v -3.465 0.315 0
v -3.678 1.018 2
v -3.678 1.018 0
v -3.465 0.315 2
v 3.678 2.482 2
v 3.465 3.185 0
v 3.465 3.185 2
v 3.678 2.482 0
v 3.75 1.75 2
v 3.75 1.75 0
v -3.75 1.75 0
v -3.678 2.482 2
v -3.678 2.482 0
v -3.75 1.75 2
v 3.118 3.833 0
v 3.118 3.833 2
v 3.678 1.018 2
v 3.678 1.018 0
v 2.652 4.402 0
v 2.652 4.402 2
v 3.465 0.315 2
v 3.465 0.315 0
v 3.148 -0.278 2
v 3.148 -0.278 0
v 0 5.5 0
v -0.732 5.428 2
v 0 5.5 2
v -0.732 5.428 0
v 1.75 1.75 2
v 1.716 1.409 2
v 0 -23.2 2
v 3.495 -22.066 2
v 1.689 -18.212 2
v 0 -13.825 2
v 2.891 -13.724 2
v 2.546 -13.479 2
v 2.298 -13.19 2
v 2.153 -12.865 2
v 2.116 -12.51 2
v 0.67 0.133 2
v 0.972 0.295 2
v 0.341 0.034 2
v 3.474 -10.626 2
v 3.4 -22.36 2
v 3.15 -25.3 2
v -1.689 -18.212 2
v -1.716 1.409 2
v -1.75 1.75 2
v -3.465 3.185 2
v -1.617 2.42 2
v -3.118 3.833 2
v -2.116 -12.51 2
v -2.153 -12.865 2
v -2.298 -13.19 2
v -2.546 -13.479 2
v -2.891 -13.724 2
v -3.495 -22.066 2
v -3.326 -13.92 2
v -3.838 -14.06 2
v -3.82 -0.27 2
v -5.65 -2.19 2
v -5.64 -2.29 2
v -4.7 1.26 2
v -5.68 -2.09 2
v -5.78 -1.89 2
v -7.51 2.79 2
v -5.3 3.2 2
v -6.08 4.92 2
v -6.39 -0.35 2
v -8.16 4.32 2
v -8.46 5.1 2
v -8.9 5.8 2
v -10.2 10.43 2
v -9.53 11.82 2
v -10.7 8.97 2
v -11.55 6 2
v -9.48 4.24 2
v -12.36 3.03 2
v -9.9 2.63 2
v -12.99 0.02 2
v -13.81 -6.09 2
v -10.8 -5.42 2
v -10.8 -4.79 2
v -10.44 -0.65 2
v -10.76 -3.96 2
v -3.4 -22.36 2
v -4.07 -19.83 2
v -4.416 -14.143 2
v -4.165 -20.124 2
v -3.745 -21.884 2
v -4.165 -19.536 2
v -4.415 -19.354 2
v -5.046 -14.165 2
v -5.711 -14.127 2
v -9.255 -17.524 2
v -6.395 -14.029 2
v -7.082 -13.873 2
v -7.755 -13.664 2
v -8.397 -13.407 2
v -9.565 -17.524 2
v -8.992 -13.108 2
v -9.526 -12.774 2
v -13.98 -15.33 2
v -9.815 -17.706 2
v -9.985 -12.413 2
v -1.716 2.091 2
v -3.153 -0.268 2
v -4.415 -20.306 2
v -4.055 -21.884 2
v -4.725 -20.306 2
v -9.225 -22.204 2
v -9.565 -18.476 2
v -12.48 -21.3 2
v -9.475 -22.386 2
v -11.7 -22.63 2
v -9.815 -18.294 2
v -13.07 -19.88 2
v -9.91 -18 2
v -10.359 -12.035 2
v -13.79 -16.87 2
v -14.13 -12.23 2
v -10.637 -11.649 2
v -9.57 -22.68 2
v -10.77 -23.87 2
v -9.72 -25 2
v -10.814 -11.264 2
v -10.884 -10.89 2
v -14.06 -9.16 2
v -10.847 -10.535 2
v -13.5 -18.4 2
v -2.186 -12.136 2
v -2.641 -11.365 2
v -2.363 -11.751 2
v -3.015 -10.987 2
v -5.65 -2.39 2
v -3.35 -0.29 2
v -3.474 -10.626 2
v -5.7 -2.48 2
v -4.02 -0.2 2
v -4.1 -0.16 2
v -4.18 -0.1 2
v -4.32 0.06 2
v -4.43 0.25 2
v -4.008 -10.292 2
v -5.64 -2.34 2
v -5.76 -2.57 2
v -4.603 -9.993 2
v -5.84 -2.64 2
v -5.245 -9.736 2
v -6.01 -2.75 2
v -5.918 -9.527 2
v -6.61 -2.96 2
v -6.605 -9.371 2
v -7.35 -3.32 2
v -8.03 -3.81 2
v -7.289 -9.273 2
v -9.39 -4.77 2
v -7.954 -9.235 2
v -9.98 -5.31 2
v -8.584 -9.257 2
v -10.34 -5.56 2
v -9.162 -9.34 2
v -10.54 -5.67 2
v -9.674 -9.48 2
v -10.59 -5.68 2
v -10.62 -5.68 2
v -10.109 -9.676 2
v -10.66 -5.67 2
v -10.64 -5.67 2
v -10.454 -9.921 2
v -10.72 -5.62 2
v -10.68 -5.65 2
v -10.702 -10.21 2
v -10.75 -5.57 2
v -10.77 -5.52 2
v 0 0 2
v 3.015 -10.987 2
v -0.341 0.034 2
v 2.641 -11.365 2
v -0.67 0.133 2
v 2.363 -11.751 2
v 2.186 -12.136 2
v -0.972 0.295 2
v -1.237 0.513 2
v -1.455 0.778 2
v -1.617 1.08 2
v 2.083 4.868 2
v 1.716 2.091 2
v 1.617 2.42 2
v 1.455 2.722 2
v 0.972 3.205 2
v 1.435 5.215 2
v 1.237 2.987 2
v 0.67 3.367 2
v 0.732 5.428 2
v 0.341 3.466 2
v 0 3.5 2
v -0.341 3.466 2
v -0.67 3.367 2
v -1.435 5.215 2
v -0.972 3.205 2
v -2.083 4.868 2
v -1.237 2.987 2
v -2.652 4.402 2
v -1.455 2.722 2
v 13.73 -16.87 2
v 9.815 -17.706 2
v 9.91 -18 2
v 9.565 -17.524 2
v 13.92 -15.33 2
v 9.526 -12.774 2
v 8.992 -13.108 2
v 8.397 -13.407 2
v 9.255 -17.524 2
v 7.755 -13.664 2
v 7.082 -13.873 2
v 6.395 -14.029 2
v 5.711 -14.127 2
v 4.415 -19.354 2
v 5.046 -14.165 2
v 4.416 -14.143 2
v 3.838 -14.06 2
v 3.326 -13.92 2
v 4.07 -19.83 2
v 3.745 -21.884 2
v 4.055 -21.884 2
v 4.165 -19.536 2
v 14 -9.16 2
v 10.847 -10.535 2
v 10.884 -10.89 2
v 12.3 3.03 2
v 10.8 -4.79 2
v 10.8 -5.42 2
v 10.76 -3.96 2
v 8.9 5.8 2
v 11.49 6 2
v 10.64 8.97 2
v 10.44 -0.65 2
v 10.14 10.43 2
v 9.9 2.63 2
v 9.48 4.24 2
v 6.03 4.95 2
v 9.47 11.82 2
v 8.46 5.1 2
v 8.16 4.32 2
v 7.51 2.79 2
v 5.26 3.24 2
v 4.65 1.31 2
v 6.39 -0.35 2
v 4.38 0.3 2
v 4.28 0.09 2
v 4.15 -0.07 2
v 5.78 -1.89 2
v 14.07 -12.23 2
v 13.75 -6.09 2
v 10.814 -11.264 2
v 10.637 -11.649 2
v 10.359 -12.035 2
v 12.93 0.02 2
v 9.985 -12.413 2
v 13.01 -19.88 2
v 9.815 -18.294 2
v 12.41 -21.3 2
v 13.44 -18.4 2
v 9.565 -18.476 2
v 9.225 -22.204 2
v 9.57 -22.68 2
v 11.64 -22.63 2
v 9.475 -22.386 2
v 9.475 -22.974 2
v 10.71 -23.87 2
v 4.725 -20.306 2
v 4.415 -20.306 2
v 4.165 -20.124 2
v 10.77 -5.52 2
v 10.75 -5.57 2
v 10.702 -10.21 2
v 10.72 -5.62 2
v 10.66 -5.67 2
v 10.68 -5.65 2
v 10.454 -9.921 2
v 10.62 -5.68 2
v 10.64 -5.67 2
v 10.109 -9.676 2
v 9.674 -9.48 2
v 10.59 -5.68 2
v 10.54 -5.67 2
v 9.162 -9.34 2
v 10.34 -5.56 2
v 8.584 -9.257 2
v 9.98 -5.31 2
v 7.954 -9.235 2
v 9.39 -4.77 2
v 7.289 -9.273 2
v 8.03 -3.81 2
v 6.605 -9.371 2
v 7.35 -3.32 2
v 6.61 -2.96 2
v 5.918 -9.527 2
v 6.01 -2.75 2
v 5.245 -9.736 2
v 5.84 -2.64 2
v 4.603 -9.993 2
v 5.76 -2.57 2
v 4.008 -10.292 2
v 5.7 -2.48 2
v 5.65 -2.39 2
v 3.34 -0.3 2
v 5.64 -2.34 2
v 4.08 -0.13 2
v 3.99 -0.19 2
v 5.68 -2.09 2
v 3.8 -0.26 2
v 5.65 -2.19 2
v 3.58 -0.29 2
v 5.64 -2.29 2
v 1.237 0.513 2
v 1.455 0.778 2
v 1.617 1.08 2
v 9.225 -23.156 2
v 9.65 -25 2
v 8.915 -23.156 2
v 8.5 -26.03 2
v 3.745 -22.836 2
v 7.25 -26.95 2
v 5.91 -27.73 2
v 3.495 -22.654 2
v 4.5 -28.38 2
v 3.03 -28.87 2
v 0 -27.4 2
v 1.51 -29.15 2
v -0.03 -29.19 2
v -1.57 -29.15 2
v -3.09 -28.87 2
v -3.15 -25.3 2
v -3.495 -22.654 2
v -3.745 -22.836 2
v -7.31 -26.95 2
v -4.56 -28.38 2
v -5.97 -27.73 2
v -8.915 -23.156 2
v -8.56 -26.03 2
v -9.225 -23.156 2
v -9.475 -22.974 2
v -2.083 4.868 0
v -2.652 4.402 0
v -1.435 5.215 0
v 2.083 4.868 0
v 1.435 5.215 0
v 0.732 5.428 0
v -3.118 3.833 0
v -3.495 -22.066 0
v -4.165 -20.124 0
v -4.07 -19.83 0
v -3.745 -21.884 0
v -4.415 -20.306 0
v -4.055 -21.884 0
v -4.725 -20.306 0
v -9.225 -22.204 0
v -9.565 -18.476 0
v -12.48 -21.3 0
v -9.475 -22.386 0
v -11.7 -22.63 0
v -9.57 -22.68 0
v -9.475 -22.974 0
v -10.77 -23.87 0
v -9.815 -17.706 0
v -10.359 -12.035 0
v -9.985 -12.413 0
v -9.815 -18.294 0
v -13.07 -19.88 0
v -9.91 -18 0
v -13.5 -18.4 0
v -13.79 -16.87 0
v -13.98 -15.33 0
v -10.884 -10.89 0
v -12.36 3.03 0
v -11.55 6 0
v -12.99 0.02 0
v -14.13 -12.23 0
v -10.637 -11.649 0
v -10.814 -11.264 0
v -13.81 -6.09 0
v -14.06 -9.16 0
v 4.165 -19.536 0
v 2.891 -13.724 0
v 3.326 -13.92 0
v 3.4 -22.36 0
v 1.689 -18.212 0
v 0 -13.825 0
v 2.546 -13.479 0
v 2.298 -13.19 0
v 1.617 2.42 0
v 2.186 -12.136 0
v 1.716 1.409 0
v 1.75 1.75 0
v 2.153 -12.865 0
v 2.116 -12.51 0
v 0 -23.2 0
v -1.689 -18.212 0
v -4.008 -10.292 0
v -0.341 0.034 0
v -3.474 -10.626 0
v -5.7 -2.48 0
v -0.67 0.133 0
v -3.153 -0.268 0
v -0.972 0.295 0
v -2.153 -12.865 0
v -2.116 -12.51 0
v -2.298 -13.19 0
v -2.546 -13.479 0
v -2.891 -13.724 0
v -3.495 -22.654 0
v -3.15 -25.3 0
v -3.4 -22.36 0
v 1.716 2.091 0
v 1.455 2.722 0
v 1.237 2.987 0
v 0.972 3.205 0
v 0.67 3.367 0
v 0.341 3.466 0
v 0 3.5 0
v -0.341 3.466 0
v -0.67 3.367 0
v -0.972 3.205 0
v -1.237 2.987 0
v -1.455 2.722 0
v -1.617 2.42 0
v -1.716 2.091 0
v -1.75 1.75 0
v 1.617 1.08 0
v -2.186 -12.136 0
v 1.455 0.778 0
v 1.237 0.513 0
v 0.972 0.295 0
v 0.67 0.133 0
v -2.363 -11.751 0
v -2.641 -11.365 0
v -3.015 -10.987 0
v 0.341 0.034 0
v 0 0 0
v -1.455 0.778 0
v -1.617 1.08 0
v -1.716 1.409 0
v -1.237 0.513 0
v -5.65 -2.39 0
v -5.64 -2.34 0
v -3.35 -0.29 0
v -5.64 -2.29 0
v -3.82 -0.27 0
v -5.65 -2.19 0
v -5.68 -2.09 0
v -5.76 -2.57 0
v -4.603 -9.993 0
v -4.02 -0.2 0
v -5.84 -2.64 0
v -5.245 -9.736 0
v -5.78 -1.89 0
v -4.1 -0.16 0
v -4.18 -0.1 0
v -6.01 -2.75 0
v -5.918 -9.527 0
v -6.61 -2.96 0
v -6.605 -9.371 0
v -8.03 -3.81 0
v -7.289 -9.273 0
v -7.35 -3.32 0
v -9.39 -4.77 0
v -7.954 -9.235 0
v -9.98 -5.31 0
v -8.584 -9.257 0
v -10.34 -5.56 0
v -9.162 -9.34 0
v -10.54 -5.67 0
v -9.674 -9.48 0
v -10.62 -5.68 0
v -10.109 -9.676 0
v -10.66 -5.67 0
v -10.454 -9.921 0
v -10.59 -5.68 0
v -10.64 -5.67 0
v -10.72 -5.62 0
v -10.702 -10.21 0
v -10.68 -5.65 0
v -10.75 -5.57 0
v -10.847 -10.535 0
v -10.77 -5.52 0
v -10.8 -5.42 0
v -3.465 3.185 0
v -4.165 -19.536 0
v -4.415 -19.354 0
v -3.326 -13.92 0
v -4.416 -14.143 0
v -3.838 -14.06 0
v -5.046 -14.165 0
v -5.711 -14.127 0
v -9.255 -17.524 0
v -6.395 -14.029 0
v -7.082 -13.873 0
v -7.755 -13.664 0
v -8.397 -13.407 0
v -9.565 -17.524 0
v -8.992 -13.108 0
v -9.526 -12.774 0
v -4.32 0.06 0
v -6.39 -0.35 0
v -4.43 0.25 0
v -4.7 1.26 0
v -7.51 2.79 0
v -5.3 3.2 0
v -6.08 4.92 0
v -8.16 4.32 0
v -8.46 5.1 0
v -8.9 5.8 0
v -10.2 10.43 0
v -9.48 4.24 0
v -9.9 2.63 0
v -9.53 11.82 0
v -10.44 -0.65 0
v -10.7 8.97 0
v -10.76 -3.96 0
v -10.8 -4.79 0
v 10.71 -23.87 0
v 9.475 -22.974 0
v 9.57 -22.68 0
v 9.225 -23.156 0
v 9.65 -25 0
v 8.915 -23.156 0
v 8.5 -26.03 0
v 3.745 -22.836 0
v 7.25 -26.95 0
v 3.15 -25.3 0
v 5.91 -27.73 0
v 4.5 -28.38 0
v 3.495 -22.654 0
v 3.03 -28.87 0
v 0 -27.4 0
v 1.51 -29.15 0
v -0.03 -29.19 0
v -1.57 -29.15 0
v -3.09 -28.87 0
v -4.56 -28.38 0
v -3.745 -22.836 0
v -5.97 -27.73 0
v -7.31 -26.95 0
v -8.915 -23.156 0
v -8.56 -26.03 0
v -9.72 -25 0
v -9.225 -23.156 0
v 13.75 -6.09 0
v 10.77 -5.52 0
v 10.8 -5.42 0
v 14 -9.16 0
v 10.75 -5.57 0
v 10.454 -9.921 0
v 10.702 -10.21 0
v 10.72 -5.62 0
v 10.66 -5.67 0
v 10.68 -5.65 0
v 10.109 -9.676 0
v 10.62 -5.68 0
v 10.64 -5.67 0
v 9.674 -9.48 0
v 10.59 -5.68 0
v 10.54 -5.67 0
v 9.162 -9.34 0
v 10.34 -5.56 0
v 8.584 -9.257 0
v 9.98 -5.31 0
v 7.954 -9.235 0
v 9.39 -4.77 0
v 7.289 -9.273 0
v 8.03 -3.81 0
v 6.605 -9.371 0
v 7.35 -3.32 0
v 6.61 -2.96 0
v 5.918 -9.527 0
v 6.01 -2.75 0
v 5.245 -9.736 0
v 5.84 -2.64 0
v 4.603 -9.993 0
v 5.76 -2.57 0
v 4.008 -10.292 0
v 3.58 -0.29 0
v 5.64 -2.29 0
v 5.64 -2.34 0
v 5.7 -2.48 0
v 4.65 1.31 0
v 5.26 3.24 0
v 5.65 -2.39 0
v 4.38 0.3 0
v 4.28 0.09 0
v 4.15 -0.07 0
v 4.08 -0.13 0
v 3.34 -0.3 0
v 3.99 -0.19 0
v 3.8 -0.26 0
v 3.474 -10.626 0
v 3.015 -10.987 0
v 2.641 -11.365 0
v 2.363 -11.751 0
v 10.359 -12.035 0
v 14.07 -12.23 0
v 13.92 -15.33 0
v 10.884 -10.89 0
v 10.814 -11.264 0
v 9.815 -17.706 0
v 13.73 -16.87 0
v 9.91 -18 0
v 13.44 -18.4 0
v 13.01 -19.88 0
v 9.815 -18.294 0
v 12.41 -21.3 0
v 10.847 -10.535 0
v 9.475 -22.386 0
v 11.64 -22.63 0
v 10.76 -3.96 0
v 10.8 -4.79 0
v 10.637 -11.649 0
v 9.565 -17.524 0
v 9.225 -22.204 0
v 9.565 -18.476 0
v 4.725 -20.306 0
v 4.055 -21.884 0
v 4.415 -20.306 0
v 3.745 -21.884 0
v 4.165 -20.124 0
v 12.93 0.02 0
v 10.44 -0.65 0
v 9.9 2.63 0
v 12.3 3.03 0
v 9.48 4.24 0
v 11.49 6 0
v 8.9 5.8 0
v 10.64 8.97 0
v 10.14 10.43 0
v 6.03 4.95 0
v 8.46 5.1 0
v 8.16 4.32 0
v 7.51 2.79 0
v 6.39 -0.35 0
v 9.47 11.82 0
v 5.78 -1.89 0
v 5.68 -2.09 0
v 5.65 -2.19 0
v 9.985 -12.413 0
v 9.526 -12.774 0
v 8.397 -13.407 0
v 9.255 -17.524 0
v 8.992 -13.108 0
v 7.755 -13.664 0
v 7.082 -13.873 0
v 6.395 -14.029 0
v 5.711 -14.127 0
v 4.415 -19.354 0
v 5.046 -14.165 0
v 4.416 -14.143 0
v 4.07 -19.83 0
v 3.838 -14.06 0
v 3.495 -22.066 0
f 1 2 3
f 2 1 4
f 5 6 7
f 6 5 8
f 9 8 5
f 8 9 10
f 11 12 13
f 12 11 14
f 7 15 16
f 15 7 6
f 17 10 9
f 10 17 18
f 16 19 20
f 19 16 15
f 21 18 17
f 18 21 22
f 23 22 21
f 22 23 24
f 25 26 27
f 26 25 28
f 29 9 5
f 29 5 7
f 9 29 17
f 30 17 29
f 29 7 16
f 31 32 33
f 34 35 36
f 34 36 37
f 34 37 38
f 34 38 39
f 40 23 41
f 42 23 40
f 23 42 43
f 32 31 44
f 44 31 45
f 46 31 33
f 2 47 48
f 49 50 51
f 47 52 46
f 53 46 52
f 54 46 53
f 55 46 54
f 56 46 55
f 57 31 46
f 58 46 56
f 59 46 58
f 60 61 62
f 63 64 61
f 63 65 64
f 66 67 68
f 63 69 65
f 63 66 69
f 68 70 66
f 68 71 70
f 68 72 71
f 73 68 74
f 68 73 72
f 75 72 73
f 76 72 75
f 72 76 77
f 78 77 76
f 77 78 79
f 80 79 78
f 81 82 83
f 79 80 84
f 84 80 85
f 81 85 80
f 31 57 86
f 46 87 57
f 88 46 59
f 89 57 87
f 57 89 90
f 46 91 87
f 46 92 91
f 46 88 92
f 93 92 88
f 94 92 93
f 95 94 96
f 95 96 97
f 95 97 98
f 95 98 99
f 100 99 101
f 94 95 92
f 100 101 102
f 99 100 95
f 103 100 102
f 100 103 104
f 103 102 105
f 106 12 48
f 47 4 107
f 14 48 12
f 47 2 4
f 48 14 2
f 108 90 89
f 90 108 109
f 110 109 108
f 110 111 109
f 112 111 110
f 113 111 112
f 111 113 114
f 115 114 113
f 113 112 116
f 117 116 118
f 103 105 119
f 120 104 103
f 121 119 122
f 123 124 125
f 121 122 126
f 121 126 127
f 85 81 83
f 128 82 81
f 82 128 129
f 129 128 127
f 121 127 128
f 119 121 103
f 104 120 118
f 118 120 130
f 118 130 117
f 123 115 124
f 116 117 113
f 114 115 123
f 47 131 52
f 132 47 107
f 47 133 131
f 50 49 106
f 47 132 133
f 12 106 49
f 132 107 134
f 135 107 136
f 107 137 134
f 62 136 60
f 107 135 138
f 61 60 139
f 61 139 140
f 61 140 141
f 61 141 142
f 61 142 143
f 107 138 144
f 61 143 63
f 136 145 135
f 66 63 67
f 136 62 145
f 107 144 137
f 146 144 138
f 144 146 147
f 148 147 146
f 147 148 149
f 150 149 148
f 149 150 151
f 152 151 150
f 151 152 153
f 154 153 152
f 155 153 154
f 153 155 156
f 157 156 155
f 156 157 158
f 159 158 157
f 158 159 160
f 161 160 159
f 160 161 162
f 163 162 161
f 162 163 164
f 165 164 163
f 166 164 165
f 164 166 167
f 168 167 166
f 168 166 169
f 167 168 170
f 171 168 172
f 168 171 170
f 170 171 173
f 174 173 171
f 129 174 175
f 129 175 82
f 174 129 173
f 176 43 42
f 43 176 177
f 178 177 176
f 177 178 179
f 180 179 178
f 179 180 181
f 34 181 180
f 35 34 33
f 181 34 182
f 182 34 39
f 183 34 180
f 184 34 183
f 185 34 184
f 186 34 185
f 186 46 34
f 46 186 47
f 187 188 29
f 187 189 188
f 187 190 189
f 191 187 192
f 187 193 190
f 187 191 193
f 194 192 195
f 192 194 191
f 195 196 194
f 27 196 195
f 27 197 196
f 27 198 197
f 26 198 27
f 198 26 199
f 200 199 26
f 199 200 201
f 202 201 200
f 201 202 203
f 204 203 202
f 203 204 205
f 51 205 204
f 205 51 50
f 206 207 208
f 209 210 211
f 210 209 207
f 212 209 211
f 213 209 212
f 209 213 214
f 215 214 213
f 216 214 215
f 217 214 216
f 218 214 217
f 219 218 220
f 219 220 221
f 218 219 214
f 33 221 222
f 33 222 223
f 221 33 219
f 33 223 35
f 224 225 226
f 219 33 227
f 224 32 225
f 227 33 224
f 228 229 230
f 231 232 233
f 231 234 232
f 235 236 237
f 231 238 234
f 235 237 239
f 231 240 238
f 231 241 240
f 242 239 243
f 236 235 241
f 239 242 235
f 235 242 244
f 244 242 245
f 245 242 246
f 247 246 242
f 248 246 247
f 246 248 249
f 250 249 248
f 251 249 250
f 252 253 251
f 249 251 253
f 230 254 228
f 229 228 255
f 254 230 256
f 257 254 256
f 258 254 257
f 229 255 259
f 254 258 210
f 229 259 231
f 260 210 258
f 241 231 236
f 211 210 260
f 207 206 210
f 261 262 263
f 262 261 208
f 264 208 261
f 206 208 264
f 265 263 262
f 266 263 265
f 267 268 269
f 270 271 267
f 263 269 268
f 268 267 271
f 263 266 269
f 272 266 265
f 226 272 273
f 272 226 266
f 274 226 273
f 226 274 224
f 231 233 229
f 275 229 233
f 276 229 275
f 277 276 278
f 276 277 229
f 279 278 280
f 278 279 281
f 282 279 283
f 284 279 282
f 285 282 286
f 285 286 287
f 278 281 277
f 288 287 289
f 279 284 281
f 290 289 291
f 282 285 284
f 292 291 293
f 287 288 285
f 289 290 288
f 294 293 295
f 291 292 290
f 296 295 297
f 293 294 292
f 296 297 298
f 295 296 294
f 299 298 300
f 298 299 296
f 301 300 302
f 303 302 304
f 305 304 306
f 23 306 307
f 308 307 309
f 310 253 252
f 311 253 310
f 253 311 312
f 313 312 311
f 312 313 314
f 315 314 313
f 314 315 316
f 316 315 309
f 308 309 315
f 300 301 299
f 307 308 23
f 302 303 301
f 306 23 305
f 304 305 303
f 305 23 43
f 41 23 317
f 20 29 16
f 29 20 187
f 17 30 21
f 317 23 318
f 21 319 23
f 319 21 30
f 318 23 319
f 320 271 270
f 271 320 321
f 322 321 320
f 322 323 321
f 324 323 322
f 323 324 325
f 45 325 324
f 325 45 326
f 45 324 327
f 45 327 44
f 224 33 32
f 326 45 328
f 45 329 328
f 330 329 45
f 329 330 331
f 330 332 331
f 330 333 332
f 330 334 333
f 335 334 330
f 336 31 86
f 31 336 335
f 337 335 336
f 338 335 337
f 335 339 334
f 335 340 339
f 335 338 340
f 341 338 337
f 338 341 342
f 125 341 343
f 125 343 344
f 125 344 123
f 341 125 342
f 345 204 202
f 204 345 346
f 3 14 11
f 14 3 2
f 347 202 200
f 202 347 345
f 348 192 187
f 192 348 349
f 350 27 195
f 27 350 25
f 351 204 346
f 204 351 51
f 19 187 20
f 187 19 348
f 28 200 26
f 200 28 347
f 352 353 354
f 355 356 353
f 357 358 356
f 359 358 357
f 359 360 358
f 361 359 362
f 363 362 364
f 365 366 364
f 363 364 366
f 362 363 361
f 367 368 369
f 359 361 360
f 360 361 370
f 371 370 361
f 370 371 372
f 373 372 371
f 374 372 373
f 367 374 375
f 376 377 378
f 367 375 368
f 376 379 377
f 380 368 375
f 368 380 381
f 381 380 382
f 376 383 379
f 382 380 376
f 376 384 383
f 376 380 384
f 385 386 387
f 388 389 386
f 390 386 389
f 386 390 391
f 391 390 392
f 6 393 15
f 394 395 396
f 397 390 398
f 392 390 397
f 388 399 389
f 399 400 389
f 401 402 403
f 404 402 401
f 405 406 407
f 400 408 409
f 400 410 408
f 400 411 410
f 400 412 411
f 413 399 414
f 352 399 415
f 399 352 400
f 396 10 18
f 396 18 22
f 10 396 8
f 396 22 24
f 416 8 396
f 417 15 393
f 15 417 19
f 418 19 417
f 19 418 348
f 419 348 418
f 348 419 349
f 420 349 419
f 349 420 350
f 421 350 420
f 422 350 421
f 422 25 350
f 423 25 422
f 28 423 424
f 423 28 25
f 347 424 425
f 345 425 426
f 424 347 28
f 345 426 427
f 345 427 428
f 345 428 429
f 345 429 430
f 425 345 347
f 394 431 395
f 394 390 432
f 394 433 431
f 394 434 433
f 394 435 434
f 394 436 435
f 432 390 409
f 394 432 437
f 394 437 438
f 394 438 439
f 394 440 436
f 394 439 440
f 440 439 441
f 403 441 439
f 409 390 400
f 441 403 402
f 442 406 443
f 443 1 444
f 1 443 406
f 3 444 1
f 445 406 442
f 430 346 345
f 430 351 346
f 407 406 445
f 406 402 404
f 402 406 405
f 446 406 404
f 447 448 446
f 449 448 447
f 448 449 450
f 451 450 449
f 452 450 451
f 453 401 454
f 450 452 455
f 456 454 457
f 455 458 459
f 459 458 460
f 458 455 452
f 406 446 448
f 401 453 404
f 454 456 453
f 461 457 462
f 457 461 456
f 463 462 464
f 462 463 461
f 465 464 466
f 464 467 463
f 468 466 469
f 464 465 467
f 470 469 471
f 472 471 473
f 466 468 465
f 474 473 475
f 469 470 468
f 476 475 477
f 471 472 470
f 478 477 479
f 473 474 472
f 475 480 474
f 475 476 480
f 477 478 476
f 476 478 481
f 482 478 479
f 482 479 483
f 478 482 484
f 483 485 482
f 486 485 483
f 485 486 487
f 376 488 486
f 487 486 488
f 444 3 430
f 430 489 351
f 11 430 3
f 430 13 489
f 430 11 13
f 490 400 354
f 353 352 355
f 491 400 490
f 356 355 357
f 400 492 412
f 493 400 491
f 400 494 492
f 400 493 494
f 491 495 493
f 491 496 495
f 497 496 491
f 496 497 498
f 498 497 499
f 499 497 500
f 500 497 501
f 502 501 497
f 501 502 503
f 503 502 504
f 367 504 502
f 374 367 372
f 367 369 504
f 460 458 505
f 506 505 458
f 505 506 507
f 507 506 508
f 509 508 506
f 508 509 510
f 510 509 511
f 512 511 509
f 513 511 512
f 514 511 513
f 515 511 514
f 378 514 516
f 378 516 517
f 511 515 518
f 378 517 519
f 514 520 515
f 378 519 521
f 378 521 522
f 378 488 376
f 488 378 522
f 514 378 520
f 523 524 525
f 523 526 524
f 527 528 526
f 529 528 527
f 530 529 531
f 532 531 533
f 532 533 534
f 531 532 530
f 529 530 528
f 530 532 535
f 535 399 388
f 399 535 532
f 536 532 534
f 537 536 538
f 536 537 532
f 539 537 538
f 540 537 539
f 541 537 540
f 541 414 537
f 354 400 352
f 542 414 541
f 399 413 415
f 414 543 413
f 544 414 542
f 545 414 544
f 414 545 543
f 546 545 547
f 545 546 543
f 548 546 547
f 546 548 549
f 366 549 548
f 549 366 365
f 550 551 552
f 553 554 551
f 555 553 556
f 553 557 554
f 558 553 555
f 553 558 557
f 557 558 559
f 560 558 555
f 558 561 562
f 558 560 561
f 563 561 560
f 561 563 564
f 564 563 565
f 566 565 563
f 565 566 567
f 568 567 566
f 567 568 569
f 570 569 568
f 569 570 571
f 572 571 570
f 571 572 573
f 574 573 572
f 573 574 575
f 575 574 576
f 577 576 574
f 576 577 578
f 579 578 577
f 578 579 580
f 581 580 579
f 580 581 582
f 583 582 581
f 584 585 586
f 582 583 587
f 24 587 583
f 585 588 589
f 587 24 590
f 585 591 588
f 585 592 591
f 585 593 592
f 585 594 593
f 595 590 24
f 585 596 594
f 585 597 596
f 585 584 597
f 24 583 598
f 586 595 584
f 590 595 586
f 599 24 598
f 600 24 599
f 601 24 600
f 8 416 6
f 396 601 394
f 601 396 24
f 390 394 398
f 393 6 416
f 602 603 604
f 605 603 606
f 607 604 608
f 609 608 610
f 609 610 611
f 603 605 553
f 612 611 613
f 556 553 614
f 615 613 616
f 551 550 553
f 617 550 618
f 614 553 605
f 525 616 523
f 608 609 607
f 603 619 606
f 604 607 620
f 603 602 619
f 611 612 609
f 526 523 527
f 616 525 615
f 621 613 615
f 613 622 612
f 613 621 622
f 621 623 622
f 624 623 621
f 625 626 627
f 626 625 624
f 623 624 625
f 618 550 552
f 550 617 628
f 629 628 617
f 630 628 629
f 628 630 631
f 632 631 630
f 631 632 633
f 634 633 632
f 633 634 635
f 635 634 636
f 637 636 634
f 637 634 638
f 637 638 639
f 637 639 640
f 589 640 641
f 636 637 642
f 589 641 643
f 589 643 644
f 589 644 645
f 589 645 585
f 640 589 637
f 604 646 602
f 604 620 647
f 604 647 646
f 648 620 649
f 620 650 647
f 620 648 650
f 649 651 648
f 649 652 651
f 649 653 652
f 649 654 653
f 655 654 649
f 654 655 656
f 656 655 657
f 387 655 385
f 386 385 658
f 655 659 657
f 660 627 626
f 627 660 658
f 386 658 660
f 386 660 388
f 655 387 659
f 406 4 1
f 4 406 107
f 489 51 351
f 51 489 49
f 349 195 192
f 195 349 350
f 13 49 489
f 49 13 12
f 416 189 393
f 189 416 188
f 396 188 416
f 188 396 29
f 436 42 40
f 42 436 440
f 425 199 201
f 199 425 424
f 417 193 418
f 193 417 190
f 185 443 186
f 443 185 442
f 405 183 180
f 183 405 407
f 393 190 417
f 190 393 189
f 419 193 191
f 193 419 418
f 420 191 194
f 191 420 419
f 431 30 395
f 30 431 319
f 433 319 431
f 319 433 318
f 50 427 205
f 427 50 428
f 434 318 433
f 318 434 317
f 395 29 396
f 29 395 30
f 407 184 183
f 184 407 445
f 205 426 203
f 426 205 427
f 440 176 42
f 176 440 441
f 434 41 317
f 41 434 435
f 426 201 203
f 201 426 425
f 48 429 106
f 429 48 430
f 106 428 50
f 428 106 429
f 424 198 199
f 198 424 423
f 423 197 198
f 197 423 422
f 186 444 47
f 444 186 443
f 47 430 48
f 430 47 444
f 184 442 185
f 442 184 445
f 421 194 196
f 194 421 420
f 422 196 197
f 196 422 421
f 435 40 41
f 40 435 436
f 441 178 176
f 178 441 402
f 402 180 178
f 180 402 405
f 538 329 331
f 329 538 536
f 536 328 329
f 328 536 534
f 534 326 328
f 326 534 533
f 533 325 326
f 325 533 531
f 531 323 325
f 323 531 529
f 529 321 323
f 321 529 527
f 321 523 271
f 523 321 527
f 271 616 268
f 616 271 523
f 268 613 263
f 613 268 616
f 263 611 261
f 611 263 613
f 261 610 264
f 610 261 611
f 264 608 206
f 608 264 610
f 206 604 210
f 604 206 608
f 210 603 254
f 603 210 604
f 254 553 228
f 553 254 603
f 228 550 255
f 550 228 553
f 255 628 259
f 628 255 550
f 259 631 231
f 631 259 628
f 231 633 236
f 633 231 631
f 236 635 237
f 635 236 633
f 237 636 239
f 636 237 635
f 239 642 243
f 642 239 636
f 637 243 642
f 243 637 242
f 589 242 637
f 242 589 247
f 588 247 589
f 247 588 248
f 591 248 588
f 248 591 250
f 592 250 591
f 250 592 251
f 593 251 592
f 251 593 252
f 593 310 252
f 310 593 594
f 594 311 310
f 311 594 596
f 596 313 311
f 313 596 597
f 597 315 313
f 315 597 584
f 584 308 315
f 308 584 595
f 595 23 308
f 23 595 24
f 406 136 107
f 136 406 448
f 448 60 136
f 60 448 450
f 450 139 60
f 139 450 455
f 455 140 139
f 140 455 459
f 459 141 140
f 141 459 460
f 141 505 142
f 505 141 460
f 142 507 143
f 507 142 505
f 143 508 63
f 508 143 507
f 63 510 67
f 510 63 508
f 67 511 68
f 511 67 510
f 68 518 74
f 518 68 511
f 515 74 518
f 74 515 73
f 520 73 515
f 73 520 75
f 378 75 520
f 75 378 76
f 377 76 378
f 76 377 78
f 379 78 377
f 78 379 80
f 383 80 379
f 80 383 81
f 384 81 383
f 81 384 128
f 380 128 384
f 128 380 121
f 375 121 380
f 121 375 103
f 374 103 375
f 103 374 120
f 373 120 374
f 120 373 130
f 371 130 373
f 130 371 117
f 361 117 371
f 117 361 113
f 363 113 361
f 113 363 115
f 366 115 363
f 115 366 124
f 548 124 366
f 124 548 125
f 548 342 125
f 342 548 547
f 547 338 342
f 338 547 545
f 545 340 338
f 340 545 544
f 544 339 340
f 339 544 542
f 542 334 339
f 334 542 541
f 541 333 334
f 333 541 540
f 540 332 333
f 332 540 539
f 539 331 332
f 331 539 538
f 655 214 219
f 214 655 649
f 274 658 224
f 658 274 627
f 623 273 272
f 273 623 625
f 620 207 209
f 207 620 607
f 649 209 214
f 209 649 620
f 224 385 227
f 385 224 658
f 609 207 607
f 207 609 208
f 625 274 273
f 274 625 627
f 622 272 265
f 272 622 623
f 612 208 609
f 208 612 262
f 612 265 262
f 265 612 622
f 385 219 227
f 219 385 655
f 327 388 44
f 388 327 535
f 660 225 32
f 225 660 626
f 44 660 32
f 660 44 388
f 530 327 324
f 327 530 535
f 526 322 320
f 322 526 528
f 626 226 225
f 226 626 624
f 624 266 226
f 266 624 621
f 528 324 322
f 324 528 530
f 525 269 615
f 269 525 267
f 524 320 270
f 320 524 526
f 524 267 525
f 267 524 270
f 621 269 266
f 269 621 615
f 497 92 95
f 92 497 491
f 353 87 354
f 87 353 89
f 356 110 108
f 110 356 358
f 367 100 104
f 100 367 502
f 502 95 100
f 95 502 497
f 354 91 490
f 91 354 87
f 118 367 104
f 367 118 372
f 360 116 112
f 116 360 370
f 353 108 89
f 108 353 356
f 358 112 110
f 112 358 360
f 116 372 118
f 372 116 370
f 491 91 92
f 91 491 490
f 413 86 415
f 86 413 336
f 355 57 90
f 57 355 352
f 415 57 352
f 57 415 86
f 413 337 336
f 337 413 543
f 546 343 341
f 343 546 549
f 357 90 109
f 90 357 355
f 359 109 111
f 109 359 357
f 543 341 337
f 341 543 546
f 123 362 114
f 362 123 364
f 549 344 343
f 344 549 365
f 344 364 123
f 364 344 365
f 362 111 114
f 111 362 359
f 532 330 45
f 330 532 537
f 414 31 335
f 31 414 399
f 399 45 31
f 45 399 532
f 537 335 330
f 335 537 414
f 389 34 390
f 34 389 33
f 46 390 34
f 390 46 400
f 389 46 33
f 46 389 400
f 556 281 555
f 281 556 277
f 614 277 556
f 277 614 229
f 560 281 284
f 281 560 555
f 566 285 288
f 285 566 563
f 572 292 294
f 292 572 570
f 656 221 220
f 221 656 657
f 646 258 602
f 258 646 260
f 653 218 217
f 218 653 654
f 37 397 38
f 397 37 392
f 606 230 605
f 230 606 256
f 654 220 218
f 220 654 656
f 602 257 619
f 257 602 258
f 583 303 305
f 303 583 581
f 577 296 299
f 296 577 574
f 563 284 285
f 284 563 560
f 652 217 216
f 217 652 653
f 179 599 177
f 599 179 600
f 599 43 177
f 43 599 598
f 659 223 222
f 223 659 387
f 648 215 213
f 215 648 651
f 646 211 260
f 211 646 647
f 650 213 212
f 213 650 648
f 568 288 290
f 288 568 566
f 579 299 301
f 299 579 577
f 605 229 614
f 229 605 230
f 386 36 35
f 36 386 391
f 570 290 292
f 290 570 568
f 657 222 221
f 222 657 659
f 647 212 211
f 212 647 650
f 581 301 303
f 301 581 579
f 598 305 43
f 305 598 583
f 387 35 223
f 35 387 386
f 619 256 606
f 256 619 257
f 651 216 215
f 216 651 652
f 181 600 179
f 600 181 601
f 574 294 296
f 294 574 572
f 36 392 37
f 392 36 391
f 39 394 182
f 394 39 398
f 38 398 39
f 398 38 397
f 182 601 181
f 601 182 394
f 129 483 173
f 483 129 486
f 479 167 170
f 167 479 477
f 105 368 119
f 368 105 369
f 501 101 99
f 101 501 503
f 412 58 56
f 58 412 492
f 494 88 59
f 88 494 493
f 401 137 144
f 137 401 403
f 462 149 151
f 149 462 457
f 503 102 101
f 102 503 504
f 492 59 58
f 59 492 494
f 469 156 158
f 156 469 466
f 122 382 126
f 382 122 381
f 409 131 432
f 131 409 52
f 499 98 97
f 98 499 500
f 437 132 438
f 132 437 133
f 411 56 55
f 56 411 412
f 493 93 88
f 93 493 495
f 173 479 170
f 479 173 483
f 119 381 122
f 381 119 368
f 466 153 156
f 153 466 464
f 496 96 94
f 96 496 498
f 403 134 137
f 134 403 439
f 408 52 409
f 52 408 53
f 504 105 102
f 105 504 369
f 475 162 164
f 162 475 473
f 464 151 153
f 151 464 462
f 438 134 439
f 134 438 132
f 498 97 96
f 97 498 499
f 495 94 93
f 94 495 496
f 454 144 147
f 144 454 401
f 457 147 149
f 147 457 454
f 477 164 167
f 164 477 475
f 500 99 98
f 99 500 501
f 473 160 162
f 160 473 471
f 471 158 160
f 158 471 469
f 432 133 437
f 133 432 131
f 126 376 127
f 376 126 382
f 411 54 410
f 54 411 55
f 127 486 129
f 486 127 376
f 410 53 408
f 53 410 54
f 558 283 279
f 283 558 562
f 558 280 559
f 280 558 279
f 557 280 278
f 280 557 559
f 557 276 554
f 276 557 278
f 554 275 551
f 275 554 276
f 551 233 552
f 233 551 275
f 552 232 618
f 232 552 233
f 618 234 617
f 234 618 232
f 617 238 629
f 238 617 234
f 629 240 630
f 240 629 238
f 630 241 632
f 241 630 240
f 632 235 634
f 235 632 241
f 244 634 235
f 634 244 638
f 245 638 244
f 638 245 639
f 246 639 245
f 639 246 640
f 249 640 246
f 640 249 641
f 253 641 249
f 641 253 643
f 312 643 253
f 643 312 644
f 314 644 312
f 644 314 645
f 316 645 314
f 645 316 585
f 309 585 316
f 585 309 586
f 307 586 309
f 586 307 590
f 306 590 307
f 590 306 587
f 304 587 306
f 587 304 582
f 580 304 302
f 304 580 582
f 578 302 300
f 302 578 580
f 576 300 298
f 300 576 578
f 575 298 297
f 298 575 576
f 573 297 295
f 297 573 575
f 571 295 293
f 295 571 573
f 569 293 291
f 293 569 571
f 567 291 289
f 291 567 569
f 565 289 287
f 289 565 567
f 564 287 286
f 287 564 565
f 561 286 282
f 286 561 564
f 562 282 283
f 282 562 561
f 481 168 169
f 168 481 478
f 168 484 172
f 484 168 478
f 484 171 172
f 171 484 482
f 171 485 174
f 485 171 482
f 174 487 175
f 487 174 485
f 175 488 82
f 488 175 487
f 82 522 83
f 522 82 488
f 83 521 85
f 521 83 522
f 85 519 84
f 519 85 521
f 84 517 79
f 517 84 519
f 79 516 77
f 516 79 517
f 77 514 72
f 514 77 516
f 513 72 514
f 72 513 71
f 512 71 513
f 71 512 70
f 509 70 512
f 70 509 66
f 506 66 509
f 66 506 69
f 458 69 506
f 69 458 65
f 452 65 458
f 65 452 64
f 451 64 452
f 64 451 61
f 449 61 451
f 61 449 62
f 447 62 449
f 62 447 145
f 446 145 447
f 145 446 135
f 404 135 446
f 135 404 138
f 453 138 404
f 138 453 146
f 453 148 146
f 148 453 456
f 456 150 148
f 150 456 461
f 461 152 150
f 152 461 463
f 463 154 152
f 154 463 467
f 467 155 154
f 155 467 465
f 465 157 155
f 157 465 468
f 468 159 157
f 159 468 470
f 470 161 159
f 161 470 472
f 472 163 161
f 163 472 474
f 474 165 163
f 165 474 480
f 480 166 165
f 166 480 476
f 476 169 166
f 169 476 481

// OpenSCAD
//Customizable Remix of Key-kitty Key Ring
//9/1/2016  By: David Bunch
//Remixed from: http://www.thingiverse.com/thing:51350
//
//1. Height of Key Ring (3.5 Original)
Ht = 2;             //[.2:.2:5]

//2. Diameter of Key Ring Hole (2.87 Original)
Hole_ID = 3.5;      //[2.5:.25:6]

//3. Thickness around Key Ring Hole (1.07 Original)
Thk = 2.0;          //[1:.2:3]

//4. Add Text to Key Ring
AddText = "no";        //[yes,no]

//5. Text to Add to Key Ring
Name = "Cat";       //Text to Add

//6. Text Height to use
Ft_Size = 5;        //[3:.2:7]

//7. Font
Ft_Name = "Liberation Sans";    //[Liberation Mono, Liberation Sans, Liberation Sans Narrow,Liberation Serif]

//8. Font Style
Ft_Style = "Bold";           //[Narrow, Narrow Italic, Narrow Bold, Italic, Bold, Bold Italic]

//9. Thickness of Text above Key Ring
Text_Ht = .5;       //[.2:.1:2]

//10. Text Y Offset
Text_Y_Offset = 8;         //[4:.2:12]

//11. Character Spacing
Text_Spacing = 1; //[.5:.1:2]

/* [Hidden] */
//Diameter of Eyes (8.94 Original)
Eye_OD = 9;         //[5:.5:12]

//Scale of Eyes in Y-axis to make oval
Eye_Scale_Y = .5;   //[.2:.05:1]

//Rotation of Oval Eyes
Eye_Rot = 15;       //[0:1:30]
Whisker_OD = 1;     //[.7:.1:2] (.77 Original)
Whisker_Res = 10;   //Originally 24;

Ft_Type = str(Ft_Name,":style=",Ft_Style);              //Create complete Font Style

Hole_OD = Hole_ID + (2 * Thk);      //Outer Diameter of Key Ring Hole
Hole_Rad = Hole_ID / 2;
Hole_OD_Res = (round(((Hole_OD * 3.14)/4) / .7)*4);     //About .7mm segments
Eye_OD_Res = (round(((Eye_OD * 3.14)/4) / .7)*4);       //Resolution of Eyes, about .7mm segments
echo(Hole_OD_Res = Hole_OD_Res);
echo(Eye_OD_Res = Eye_OD_Res);

echo(Ft_Type = Ft_Type);
module CatOutline()
{
    union()
    {
        color("cyan")
        {
            linear_extrude(height = Ht, center = false, convexity = 10)polygon(points = 
            [[-2.82,-0.23],[-3.35,-0.29],[-3.82,-0.27],[-4.02,-0.2],[-4.1,-0.16],
            [-4.18,-0.1],[-4.32,0.06],[-4.43,0.25],[-4.7,1.26],[-5.3,3.2],
            [-6.08,4.92],[-9.53,11.82],[-10.2,10.43],[-10.7,8.97],[-11.55,6],
            [-12.36,3.03],[-12.99,0.02],[-13.81,-6.09],[-14.06,-9.16],[-14.13,-12.23],
            [-13.98,-15.33],[-13.79,-16.87],[-13.5,-18.4],[-13.07,-19.88],[-12.48,-21.3],
            [-11.7,-22.63],[-10.77,-23.87],[-9.72,-25],[-8.56,-26.03],[-7.31,-26.95],
            [-5.97,-27.73],[-4.56,-28.38],[-3.09,-28.87],[-1.57,-29.15],[-0.03,-29.19],
            [1.51,-29.15],[3.03,-28.87],[4.5,-28.38],[5.91,-27.73],[7.25,-26.95],
            [8.5,-26.03],[9.65,-25],[10.71,-23.87],[11.64,-22.63],[12.41,-21.3],
            [13.01,-19.88],[13.44,-18.4],[13.73,-16.87],[13.92,-15.33],[14.07,-12.23],
            [14,-9.16],[13.75,-6.09],[12.93,0.02],[12.3,3.03],[11.49,6],
            [10.64,8.97],[10.14,10.43],[9.47,11.82],[6.03,4.95],[5.26,3.24],
            [4.65,1.31],[4.38,0.3],[4.28,0.09],[4.15,-0.07],[4.08,-0.13],
            [3.99,-0.19],[3.8,-0.26],[3.58,-0.29],[3.34,-0.3],[2.82,-0.24],
            [1.89,-0.11],[0.95,-0.03],[0,0],[-0.95,-0.03],[-1.89,-0.1],
            [-2.82,-0.23]]);
            translate([0,Hole_Rad,0])
            {
                difference()
                {
                    cylinder(d=Hole_OD,h=Ht,$fn=Hole_OD_Res);
                    translate([0,0,-1])
                    cylinder(d=Hole_ID,h=Ht+2,$fn=Hole_OD_Res);
                }
            }
        }
        if (AddText == "yes")
        {
            translate([0,-Text_Y_Offset,Ht-.1])
            color("red")
            linear_extrude(height = Text_Ht + .1) {
            {
                text(Name, size = Ft_Size, halign = "center",spacing = Text_Spacing, font = Ft_Type);
            }
        }
        }
    }
}
module Ear()
{
    translate([0,0,-1])
    linear_extrude(height = Ht+2, center = false, convexity = 10)polygon(points = 
    [[8.9,5.8],[8.46,5.1],[8.16,4.32],[7.51,2.79],[6.39,-0.35],
    [5.78,-1.89],[5.68,-2.09],[5.65,-2.19],[5.64,-2.29],[5.64,-2.34],
    [5.65,-2.39],[5.7,-2.48],[5.76,-2.57],[5.84,-2.64],[6.01,-2.75],
    [6.21,-2.82],[6.61,-2.96],[7.35,-3.32],[8.03,-3.81],[9.39,-4.77],
    [9.98,-5.31],[10.34,-5.56],[10.54,-5.67],[10.59,-5.68],[10.62,-5.68],
    [10.64,-5.67],[10.66,-5.67],[10.68,-5.65],[10.72,-5.62],[10.75,-5.57],
    [10.77,-5.52],[10.8,-5.42],[10.8,-5.21],[10.8,-4.79],[10.76,-3.96],
    [10.44,-0.65],[9.9,2.63],[9.48,4.24]]);
}
module Whiskers()
{
//Top Whisker to the Right
    hull()
    {
        translate([4.57,-19.83,-1])
        cylinder(d=Whisker_OD,h=Ht+2,$fn=Whisker_Res);
        translate([9.41,-18,-1])
        cylinder(d=Whisker_OD,h=Ht+2,$fn=Whisker_Res);
    }
//Bottom Whisker to the Right
    hull()
    {
        translate([3.9,-22.36,-1])
        cylinder(d=Whisker_OD,h=Ht+2,$fn=Whisker_Res);
        translate([9.07,-22.68,-1])
        cylinder(d=Whisker_OD,h=Ht+2,$fn=Whisker_Res);
    }
}
module Eye()
{
    translate([6.5,-11.7,-1])
    rotate([0,0,Eye_Rot])                           //Rotate a little
    scale([1,Eye_Scale_Y,1])                        //Make eye thinner in the vertical
    cylinder(d=Eye_OD,h=Ht+2,$fn=Eye_OD_Res);       //Right Eye
}
difference()
{
    CatOutline();

    Whiskers();                         //Right Whiskers
    mirror([1,0,0])
    Whiskers();                         //Left Whiskers

    translate([0,-25.3,-1])
    scale([1.5,1,1])
    cylinder(d=4.2,h=Ht+2,$fn=4);       //Mouth 

    translate([0,-16.75,-1])
    scale([1,1.5,1])
    rotate([0,0,90])
    cylinder(d=3.9,h=Ht+2,$fn=3);       //Nose

    Eye();                              //Right Eye
    mirror([1,0,0])
    Eye();                              //Left Eye

    Ear();                              //Right Ear
    mirror([1,0,0])
    Ear();                              //Left Ear
}
